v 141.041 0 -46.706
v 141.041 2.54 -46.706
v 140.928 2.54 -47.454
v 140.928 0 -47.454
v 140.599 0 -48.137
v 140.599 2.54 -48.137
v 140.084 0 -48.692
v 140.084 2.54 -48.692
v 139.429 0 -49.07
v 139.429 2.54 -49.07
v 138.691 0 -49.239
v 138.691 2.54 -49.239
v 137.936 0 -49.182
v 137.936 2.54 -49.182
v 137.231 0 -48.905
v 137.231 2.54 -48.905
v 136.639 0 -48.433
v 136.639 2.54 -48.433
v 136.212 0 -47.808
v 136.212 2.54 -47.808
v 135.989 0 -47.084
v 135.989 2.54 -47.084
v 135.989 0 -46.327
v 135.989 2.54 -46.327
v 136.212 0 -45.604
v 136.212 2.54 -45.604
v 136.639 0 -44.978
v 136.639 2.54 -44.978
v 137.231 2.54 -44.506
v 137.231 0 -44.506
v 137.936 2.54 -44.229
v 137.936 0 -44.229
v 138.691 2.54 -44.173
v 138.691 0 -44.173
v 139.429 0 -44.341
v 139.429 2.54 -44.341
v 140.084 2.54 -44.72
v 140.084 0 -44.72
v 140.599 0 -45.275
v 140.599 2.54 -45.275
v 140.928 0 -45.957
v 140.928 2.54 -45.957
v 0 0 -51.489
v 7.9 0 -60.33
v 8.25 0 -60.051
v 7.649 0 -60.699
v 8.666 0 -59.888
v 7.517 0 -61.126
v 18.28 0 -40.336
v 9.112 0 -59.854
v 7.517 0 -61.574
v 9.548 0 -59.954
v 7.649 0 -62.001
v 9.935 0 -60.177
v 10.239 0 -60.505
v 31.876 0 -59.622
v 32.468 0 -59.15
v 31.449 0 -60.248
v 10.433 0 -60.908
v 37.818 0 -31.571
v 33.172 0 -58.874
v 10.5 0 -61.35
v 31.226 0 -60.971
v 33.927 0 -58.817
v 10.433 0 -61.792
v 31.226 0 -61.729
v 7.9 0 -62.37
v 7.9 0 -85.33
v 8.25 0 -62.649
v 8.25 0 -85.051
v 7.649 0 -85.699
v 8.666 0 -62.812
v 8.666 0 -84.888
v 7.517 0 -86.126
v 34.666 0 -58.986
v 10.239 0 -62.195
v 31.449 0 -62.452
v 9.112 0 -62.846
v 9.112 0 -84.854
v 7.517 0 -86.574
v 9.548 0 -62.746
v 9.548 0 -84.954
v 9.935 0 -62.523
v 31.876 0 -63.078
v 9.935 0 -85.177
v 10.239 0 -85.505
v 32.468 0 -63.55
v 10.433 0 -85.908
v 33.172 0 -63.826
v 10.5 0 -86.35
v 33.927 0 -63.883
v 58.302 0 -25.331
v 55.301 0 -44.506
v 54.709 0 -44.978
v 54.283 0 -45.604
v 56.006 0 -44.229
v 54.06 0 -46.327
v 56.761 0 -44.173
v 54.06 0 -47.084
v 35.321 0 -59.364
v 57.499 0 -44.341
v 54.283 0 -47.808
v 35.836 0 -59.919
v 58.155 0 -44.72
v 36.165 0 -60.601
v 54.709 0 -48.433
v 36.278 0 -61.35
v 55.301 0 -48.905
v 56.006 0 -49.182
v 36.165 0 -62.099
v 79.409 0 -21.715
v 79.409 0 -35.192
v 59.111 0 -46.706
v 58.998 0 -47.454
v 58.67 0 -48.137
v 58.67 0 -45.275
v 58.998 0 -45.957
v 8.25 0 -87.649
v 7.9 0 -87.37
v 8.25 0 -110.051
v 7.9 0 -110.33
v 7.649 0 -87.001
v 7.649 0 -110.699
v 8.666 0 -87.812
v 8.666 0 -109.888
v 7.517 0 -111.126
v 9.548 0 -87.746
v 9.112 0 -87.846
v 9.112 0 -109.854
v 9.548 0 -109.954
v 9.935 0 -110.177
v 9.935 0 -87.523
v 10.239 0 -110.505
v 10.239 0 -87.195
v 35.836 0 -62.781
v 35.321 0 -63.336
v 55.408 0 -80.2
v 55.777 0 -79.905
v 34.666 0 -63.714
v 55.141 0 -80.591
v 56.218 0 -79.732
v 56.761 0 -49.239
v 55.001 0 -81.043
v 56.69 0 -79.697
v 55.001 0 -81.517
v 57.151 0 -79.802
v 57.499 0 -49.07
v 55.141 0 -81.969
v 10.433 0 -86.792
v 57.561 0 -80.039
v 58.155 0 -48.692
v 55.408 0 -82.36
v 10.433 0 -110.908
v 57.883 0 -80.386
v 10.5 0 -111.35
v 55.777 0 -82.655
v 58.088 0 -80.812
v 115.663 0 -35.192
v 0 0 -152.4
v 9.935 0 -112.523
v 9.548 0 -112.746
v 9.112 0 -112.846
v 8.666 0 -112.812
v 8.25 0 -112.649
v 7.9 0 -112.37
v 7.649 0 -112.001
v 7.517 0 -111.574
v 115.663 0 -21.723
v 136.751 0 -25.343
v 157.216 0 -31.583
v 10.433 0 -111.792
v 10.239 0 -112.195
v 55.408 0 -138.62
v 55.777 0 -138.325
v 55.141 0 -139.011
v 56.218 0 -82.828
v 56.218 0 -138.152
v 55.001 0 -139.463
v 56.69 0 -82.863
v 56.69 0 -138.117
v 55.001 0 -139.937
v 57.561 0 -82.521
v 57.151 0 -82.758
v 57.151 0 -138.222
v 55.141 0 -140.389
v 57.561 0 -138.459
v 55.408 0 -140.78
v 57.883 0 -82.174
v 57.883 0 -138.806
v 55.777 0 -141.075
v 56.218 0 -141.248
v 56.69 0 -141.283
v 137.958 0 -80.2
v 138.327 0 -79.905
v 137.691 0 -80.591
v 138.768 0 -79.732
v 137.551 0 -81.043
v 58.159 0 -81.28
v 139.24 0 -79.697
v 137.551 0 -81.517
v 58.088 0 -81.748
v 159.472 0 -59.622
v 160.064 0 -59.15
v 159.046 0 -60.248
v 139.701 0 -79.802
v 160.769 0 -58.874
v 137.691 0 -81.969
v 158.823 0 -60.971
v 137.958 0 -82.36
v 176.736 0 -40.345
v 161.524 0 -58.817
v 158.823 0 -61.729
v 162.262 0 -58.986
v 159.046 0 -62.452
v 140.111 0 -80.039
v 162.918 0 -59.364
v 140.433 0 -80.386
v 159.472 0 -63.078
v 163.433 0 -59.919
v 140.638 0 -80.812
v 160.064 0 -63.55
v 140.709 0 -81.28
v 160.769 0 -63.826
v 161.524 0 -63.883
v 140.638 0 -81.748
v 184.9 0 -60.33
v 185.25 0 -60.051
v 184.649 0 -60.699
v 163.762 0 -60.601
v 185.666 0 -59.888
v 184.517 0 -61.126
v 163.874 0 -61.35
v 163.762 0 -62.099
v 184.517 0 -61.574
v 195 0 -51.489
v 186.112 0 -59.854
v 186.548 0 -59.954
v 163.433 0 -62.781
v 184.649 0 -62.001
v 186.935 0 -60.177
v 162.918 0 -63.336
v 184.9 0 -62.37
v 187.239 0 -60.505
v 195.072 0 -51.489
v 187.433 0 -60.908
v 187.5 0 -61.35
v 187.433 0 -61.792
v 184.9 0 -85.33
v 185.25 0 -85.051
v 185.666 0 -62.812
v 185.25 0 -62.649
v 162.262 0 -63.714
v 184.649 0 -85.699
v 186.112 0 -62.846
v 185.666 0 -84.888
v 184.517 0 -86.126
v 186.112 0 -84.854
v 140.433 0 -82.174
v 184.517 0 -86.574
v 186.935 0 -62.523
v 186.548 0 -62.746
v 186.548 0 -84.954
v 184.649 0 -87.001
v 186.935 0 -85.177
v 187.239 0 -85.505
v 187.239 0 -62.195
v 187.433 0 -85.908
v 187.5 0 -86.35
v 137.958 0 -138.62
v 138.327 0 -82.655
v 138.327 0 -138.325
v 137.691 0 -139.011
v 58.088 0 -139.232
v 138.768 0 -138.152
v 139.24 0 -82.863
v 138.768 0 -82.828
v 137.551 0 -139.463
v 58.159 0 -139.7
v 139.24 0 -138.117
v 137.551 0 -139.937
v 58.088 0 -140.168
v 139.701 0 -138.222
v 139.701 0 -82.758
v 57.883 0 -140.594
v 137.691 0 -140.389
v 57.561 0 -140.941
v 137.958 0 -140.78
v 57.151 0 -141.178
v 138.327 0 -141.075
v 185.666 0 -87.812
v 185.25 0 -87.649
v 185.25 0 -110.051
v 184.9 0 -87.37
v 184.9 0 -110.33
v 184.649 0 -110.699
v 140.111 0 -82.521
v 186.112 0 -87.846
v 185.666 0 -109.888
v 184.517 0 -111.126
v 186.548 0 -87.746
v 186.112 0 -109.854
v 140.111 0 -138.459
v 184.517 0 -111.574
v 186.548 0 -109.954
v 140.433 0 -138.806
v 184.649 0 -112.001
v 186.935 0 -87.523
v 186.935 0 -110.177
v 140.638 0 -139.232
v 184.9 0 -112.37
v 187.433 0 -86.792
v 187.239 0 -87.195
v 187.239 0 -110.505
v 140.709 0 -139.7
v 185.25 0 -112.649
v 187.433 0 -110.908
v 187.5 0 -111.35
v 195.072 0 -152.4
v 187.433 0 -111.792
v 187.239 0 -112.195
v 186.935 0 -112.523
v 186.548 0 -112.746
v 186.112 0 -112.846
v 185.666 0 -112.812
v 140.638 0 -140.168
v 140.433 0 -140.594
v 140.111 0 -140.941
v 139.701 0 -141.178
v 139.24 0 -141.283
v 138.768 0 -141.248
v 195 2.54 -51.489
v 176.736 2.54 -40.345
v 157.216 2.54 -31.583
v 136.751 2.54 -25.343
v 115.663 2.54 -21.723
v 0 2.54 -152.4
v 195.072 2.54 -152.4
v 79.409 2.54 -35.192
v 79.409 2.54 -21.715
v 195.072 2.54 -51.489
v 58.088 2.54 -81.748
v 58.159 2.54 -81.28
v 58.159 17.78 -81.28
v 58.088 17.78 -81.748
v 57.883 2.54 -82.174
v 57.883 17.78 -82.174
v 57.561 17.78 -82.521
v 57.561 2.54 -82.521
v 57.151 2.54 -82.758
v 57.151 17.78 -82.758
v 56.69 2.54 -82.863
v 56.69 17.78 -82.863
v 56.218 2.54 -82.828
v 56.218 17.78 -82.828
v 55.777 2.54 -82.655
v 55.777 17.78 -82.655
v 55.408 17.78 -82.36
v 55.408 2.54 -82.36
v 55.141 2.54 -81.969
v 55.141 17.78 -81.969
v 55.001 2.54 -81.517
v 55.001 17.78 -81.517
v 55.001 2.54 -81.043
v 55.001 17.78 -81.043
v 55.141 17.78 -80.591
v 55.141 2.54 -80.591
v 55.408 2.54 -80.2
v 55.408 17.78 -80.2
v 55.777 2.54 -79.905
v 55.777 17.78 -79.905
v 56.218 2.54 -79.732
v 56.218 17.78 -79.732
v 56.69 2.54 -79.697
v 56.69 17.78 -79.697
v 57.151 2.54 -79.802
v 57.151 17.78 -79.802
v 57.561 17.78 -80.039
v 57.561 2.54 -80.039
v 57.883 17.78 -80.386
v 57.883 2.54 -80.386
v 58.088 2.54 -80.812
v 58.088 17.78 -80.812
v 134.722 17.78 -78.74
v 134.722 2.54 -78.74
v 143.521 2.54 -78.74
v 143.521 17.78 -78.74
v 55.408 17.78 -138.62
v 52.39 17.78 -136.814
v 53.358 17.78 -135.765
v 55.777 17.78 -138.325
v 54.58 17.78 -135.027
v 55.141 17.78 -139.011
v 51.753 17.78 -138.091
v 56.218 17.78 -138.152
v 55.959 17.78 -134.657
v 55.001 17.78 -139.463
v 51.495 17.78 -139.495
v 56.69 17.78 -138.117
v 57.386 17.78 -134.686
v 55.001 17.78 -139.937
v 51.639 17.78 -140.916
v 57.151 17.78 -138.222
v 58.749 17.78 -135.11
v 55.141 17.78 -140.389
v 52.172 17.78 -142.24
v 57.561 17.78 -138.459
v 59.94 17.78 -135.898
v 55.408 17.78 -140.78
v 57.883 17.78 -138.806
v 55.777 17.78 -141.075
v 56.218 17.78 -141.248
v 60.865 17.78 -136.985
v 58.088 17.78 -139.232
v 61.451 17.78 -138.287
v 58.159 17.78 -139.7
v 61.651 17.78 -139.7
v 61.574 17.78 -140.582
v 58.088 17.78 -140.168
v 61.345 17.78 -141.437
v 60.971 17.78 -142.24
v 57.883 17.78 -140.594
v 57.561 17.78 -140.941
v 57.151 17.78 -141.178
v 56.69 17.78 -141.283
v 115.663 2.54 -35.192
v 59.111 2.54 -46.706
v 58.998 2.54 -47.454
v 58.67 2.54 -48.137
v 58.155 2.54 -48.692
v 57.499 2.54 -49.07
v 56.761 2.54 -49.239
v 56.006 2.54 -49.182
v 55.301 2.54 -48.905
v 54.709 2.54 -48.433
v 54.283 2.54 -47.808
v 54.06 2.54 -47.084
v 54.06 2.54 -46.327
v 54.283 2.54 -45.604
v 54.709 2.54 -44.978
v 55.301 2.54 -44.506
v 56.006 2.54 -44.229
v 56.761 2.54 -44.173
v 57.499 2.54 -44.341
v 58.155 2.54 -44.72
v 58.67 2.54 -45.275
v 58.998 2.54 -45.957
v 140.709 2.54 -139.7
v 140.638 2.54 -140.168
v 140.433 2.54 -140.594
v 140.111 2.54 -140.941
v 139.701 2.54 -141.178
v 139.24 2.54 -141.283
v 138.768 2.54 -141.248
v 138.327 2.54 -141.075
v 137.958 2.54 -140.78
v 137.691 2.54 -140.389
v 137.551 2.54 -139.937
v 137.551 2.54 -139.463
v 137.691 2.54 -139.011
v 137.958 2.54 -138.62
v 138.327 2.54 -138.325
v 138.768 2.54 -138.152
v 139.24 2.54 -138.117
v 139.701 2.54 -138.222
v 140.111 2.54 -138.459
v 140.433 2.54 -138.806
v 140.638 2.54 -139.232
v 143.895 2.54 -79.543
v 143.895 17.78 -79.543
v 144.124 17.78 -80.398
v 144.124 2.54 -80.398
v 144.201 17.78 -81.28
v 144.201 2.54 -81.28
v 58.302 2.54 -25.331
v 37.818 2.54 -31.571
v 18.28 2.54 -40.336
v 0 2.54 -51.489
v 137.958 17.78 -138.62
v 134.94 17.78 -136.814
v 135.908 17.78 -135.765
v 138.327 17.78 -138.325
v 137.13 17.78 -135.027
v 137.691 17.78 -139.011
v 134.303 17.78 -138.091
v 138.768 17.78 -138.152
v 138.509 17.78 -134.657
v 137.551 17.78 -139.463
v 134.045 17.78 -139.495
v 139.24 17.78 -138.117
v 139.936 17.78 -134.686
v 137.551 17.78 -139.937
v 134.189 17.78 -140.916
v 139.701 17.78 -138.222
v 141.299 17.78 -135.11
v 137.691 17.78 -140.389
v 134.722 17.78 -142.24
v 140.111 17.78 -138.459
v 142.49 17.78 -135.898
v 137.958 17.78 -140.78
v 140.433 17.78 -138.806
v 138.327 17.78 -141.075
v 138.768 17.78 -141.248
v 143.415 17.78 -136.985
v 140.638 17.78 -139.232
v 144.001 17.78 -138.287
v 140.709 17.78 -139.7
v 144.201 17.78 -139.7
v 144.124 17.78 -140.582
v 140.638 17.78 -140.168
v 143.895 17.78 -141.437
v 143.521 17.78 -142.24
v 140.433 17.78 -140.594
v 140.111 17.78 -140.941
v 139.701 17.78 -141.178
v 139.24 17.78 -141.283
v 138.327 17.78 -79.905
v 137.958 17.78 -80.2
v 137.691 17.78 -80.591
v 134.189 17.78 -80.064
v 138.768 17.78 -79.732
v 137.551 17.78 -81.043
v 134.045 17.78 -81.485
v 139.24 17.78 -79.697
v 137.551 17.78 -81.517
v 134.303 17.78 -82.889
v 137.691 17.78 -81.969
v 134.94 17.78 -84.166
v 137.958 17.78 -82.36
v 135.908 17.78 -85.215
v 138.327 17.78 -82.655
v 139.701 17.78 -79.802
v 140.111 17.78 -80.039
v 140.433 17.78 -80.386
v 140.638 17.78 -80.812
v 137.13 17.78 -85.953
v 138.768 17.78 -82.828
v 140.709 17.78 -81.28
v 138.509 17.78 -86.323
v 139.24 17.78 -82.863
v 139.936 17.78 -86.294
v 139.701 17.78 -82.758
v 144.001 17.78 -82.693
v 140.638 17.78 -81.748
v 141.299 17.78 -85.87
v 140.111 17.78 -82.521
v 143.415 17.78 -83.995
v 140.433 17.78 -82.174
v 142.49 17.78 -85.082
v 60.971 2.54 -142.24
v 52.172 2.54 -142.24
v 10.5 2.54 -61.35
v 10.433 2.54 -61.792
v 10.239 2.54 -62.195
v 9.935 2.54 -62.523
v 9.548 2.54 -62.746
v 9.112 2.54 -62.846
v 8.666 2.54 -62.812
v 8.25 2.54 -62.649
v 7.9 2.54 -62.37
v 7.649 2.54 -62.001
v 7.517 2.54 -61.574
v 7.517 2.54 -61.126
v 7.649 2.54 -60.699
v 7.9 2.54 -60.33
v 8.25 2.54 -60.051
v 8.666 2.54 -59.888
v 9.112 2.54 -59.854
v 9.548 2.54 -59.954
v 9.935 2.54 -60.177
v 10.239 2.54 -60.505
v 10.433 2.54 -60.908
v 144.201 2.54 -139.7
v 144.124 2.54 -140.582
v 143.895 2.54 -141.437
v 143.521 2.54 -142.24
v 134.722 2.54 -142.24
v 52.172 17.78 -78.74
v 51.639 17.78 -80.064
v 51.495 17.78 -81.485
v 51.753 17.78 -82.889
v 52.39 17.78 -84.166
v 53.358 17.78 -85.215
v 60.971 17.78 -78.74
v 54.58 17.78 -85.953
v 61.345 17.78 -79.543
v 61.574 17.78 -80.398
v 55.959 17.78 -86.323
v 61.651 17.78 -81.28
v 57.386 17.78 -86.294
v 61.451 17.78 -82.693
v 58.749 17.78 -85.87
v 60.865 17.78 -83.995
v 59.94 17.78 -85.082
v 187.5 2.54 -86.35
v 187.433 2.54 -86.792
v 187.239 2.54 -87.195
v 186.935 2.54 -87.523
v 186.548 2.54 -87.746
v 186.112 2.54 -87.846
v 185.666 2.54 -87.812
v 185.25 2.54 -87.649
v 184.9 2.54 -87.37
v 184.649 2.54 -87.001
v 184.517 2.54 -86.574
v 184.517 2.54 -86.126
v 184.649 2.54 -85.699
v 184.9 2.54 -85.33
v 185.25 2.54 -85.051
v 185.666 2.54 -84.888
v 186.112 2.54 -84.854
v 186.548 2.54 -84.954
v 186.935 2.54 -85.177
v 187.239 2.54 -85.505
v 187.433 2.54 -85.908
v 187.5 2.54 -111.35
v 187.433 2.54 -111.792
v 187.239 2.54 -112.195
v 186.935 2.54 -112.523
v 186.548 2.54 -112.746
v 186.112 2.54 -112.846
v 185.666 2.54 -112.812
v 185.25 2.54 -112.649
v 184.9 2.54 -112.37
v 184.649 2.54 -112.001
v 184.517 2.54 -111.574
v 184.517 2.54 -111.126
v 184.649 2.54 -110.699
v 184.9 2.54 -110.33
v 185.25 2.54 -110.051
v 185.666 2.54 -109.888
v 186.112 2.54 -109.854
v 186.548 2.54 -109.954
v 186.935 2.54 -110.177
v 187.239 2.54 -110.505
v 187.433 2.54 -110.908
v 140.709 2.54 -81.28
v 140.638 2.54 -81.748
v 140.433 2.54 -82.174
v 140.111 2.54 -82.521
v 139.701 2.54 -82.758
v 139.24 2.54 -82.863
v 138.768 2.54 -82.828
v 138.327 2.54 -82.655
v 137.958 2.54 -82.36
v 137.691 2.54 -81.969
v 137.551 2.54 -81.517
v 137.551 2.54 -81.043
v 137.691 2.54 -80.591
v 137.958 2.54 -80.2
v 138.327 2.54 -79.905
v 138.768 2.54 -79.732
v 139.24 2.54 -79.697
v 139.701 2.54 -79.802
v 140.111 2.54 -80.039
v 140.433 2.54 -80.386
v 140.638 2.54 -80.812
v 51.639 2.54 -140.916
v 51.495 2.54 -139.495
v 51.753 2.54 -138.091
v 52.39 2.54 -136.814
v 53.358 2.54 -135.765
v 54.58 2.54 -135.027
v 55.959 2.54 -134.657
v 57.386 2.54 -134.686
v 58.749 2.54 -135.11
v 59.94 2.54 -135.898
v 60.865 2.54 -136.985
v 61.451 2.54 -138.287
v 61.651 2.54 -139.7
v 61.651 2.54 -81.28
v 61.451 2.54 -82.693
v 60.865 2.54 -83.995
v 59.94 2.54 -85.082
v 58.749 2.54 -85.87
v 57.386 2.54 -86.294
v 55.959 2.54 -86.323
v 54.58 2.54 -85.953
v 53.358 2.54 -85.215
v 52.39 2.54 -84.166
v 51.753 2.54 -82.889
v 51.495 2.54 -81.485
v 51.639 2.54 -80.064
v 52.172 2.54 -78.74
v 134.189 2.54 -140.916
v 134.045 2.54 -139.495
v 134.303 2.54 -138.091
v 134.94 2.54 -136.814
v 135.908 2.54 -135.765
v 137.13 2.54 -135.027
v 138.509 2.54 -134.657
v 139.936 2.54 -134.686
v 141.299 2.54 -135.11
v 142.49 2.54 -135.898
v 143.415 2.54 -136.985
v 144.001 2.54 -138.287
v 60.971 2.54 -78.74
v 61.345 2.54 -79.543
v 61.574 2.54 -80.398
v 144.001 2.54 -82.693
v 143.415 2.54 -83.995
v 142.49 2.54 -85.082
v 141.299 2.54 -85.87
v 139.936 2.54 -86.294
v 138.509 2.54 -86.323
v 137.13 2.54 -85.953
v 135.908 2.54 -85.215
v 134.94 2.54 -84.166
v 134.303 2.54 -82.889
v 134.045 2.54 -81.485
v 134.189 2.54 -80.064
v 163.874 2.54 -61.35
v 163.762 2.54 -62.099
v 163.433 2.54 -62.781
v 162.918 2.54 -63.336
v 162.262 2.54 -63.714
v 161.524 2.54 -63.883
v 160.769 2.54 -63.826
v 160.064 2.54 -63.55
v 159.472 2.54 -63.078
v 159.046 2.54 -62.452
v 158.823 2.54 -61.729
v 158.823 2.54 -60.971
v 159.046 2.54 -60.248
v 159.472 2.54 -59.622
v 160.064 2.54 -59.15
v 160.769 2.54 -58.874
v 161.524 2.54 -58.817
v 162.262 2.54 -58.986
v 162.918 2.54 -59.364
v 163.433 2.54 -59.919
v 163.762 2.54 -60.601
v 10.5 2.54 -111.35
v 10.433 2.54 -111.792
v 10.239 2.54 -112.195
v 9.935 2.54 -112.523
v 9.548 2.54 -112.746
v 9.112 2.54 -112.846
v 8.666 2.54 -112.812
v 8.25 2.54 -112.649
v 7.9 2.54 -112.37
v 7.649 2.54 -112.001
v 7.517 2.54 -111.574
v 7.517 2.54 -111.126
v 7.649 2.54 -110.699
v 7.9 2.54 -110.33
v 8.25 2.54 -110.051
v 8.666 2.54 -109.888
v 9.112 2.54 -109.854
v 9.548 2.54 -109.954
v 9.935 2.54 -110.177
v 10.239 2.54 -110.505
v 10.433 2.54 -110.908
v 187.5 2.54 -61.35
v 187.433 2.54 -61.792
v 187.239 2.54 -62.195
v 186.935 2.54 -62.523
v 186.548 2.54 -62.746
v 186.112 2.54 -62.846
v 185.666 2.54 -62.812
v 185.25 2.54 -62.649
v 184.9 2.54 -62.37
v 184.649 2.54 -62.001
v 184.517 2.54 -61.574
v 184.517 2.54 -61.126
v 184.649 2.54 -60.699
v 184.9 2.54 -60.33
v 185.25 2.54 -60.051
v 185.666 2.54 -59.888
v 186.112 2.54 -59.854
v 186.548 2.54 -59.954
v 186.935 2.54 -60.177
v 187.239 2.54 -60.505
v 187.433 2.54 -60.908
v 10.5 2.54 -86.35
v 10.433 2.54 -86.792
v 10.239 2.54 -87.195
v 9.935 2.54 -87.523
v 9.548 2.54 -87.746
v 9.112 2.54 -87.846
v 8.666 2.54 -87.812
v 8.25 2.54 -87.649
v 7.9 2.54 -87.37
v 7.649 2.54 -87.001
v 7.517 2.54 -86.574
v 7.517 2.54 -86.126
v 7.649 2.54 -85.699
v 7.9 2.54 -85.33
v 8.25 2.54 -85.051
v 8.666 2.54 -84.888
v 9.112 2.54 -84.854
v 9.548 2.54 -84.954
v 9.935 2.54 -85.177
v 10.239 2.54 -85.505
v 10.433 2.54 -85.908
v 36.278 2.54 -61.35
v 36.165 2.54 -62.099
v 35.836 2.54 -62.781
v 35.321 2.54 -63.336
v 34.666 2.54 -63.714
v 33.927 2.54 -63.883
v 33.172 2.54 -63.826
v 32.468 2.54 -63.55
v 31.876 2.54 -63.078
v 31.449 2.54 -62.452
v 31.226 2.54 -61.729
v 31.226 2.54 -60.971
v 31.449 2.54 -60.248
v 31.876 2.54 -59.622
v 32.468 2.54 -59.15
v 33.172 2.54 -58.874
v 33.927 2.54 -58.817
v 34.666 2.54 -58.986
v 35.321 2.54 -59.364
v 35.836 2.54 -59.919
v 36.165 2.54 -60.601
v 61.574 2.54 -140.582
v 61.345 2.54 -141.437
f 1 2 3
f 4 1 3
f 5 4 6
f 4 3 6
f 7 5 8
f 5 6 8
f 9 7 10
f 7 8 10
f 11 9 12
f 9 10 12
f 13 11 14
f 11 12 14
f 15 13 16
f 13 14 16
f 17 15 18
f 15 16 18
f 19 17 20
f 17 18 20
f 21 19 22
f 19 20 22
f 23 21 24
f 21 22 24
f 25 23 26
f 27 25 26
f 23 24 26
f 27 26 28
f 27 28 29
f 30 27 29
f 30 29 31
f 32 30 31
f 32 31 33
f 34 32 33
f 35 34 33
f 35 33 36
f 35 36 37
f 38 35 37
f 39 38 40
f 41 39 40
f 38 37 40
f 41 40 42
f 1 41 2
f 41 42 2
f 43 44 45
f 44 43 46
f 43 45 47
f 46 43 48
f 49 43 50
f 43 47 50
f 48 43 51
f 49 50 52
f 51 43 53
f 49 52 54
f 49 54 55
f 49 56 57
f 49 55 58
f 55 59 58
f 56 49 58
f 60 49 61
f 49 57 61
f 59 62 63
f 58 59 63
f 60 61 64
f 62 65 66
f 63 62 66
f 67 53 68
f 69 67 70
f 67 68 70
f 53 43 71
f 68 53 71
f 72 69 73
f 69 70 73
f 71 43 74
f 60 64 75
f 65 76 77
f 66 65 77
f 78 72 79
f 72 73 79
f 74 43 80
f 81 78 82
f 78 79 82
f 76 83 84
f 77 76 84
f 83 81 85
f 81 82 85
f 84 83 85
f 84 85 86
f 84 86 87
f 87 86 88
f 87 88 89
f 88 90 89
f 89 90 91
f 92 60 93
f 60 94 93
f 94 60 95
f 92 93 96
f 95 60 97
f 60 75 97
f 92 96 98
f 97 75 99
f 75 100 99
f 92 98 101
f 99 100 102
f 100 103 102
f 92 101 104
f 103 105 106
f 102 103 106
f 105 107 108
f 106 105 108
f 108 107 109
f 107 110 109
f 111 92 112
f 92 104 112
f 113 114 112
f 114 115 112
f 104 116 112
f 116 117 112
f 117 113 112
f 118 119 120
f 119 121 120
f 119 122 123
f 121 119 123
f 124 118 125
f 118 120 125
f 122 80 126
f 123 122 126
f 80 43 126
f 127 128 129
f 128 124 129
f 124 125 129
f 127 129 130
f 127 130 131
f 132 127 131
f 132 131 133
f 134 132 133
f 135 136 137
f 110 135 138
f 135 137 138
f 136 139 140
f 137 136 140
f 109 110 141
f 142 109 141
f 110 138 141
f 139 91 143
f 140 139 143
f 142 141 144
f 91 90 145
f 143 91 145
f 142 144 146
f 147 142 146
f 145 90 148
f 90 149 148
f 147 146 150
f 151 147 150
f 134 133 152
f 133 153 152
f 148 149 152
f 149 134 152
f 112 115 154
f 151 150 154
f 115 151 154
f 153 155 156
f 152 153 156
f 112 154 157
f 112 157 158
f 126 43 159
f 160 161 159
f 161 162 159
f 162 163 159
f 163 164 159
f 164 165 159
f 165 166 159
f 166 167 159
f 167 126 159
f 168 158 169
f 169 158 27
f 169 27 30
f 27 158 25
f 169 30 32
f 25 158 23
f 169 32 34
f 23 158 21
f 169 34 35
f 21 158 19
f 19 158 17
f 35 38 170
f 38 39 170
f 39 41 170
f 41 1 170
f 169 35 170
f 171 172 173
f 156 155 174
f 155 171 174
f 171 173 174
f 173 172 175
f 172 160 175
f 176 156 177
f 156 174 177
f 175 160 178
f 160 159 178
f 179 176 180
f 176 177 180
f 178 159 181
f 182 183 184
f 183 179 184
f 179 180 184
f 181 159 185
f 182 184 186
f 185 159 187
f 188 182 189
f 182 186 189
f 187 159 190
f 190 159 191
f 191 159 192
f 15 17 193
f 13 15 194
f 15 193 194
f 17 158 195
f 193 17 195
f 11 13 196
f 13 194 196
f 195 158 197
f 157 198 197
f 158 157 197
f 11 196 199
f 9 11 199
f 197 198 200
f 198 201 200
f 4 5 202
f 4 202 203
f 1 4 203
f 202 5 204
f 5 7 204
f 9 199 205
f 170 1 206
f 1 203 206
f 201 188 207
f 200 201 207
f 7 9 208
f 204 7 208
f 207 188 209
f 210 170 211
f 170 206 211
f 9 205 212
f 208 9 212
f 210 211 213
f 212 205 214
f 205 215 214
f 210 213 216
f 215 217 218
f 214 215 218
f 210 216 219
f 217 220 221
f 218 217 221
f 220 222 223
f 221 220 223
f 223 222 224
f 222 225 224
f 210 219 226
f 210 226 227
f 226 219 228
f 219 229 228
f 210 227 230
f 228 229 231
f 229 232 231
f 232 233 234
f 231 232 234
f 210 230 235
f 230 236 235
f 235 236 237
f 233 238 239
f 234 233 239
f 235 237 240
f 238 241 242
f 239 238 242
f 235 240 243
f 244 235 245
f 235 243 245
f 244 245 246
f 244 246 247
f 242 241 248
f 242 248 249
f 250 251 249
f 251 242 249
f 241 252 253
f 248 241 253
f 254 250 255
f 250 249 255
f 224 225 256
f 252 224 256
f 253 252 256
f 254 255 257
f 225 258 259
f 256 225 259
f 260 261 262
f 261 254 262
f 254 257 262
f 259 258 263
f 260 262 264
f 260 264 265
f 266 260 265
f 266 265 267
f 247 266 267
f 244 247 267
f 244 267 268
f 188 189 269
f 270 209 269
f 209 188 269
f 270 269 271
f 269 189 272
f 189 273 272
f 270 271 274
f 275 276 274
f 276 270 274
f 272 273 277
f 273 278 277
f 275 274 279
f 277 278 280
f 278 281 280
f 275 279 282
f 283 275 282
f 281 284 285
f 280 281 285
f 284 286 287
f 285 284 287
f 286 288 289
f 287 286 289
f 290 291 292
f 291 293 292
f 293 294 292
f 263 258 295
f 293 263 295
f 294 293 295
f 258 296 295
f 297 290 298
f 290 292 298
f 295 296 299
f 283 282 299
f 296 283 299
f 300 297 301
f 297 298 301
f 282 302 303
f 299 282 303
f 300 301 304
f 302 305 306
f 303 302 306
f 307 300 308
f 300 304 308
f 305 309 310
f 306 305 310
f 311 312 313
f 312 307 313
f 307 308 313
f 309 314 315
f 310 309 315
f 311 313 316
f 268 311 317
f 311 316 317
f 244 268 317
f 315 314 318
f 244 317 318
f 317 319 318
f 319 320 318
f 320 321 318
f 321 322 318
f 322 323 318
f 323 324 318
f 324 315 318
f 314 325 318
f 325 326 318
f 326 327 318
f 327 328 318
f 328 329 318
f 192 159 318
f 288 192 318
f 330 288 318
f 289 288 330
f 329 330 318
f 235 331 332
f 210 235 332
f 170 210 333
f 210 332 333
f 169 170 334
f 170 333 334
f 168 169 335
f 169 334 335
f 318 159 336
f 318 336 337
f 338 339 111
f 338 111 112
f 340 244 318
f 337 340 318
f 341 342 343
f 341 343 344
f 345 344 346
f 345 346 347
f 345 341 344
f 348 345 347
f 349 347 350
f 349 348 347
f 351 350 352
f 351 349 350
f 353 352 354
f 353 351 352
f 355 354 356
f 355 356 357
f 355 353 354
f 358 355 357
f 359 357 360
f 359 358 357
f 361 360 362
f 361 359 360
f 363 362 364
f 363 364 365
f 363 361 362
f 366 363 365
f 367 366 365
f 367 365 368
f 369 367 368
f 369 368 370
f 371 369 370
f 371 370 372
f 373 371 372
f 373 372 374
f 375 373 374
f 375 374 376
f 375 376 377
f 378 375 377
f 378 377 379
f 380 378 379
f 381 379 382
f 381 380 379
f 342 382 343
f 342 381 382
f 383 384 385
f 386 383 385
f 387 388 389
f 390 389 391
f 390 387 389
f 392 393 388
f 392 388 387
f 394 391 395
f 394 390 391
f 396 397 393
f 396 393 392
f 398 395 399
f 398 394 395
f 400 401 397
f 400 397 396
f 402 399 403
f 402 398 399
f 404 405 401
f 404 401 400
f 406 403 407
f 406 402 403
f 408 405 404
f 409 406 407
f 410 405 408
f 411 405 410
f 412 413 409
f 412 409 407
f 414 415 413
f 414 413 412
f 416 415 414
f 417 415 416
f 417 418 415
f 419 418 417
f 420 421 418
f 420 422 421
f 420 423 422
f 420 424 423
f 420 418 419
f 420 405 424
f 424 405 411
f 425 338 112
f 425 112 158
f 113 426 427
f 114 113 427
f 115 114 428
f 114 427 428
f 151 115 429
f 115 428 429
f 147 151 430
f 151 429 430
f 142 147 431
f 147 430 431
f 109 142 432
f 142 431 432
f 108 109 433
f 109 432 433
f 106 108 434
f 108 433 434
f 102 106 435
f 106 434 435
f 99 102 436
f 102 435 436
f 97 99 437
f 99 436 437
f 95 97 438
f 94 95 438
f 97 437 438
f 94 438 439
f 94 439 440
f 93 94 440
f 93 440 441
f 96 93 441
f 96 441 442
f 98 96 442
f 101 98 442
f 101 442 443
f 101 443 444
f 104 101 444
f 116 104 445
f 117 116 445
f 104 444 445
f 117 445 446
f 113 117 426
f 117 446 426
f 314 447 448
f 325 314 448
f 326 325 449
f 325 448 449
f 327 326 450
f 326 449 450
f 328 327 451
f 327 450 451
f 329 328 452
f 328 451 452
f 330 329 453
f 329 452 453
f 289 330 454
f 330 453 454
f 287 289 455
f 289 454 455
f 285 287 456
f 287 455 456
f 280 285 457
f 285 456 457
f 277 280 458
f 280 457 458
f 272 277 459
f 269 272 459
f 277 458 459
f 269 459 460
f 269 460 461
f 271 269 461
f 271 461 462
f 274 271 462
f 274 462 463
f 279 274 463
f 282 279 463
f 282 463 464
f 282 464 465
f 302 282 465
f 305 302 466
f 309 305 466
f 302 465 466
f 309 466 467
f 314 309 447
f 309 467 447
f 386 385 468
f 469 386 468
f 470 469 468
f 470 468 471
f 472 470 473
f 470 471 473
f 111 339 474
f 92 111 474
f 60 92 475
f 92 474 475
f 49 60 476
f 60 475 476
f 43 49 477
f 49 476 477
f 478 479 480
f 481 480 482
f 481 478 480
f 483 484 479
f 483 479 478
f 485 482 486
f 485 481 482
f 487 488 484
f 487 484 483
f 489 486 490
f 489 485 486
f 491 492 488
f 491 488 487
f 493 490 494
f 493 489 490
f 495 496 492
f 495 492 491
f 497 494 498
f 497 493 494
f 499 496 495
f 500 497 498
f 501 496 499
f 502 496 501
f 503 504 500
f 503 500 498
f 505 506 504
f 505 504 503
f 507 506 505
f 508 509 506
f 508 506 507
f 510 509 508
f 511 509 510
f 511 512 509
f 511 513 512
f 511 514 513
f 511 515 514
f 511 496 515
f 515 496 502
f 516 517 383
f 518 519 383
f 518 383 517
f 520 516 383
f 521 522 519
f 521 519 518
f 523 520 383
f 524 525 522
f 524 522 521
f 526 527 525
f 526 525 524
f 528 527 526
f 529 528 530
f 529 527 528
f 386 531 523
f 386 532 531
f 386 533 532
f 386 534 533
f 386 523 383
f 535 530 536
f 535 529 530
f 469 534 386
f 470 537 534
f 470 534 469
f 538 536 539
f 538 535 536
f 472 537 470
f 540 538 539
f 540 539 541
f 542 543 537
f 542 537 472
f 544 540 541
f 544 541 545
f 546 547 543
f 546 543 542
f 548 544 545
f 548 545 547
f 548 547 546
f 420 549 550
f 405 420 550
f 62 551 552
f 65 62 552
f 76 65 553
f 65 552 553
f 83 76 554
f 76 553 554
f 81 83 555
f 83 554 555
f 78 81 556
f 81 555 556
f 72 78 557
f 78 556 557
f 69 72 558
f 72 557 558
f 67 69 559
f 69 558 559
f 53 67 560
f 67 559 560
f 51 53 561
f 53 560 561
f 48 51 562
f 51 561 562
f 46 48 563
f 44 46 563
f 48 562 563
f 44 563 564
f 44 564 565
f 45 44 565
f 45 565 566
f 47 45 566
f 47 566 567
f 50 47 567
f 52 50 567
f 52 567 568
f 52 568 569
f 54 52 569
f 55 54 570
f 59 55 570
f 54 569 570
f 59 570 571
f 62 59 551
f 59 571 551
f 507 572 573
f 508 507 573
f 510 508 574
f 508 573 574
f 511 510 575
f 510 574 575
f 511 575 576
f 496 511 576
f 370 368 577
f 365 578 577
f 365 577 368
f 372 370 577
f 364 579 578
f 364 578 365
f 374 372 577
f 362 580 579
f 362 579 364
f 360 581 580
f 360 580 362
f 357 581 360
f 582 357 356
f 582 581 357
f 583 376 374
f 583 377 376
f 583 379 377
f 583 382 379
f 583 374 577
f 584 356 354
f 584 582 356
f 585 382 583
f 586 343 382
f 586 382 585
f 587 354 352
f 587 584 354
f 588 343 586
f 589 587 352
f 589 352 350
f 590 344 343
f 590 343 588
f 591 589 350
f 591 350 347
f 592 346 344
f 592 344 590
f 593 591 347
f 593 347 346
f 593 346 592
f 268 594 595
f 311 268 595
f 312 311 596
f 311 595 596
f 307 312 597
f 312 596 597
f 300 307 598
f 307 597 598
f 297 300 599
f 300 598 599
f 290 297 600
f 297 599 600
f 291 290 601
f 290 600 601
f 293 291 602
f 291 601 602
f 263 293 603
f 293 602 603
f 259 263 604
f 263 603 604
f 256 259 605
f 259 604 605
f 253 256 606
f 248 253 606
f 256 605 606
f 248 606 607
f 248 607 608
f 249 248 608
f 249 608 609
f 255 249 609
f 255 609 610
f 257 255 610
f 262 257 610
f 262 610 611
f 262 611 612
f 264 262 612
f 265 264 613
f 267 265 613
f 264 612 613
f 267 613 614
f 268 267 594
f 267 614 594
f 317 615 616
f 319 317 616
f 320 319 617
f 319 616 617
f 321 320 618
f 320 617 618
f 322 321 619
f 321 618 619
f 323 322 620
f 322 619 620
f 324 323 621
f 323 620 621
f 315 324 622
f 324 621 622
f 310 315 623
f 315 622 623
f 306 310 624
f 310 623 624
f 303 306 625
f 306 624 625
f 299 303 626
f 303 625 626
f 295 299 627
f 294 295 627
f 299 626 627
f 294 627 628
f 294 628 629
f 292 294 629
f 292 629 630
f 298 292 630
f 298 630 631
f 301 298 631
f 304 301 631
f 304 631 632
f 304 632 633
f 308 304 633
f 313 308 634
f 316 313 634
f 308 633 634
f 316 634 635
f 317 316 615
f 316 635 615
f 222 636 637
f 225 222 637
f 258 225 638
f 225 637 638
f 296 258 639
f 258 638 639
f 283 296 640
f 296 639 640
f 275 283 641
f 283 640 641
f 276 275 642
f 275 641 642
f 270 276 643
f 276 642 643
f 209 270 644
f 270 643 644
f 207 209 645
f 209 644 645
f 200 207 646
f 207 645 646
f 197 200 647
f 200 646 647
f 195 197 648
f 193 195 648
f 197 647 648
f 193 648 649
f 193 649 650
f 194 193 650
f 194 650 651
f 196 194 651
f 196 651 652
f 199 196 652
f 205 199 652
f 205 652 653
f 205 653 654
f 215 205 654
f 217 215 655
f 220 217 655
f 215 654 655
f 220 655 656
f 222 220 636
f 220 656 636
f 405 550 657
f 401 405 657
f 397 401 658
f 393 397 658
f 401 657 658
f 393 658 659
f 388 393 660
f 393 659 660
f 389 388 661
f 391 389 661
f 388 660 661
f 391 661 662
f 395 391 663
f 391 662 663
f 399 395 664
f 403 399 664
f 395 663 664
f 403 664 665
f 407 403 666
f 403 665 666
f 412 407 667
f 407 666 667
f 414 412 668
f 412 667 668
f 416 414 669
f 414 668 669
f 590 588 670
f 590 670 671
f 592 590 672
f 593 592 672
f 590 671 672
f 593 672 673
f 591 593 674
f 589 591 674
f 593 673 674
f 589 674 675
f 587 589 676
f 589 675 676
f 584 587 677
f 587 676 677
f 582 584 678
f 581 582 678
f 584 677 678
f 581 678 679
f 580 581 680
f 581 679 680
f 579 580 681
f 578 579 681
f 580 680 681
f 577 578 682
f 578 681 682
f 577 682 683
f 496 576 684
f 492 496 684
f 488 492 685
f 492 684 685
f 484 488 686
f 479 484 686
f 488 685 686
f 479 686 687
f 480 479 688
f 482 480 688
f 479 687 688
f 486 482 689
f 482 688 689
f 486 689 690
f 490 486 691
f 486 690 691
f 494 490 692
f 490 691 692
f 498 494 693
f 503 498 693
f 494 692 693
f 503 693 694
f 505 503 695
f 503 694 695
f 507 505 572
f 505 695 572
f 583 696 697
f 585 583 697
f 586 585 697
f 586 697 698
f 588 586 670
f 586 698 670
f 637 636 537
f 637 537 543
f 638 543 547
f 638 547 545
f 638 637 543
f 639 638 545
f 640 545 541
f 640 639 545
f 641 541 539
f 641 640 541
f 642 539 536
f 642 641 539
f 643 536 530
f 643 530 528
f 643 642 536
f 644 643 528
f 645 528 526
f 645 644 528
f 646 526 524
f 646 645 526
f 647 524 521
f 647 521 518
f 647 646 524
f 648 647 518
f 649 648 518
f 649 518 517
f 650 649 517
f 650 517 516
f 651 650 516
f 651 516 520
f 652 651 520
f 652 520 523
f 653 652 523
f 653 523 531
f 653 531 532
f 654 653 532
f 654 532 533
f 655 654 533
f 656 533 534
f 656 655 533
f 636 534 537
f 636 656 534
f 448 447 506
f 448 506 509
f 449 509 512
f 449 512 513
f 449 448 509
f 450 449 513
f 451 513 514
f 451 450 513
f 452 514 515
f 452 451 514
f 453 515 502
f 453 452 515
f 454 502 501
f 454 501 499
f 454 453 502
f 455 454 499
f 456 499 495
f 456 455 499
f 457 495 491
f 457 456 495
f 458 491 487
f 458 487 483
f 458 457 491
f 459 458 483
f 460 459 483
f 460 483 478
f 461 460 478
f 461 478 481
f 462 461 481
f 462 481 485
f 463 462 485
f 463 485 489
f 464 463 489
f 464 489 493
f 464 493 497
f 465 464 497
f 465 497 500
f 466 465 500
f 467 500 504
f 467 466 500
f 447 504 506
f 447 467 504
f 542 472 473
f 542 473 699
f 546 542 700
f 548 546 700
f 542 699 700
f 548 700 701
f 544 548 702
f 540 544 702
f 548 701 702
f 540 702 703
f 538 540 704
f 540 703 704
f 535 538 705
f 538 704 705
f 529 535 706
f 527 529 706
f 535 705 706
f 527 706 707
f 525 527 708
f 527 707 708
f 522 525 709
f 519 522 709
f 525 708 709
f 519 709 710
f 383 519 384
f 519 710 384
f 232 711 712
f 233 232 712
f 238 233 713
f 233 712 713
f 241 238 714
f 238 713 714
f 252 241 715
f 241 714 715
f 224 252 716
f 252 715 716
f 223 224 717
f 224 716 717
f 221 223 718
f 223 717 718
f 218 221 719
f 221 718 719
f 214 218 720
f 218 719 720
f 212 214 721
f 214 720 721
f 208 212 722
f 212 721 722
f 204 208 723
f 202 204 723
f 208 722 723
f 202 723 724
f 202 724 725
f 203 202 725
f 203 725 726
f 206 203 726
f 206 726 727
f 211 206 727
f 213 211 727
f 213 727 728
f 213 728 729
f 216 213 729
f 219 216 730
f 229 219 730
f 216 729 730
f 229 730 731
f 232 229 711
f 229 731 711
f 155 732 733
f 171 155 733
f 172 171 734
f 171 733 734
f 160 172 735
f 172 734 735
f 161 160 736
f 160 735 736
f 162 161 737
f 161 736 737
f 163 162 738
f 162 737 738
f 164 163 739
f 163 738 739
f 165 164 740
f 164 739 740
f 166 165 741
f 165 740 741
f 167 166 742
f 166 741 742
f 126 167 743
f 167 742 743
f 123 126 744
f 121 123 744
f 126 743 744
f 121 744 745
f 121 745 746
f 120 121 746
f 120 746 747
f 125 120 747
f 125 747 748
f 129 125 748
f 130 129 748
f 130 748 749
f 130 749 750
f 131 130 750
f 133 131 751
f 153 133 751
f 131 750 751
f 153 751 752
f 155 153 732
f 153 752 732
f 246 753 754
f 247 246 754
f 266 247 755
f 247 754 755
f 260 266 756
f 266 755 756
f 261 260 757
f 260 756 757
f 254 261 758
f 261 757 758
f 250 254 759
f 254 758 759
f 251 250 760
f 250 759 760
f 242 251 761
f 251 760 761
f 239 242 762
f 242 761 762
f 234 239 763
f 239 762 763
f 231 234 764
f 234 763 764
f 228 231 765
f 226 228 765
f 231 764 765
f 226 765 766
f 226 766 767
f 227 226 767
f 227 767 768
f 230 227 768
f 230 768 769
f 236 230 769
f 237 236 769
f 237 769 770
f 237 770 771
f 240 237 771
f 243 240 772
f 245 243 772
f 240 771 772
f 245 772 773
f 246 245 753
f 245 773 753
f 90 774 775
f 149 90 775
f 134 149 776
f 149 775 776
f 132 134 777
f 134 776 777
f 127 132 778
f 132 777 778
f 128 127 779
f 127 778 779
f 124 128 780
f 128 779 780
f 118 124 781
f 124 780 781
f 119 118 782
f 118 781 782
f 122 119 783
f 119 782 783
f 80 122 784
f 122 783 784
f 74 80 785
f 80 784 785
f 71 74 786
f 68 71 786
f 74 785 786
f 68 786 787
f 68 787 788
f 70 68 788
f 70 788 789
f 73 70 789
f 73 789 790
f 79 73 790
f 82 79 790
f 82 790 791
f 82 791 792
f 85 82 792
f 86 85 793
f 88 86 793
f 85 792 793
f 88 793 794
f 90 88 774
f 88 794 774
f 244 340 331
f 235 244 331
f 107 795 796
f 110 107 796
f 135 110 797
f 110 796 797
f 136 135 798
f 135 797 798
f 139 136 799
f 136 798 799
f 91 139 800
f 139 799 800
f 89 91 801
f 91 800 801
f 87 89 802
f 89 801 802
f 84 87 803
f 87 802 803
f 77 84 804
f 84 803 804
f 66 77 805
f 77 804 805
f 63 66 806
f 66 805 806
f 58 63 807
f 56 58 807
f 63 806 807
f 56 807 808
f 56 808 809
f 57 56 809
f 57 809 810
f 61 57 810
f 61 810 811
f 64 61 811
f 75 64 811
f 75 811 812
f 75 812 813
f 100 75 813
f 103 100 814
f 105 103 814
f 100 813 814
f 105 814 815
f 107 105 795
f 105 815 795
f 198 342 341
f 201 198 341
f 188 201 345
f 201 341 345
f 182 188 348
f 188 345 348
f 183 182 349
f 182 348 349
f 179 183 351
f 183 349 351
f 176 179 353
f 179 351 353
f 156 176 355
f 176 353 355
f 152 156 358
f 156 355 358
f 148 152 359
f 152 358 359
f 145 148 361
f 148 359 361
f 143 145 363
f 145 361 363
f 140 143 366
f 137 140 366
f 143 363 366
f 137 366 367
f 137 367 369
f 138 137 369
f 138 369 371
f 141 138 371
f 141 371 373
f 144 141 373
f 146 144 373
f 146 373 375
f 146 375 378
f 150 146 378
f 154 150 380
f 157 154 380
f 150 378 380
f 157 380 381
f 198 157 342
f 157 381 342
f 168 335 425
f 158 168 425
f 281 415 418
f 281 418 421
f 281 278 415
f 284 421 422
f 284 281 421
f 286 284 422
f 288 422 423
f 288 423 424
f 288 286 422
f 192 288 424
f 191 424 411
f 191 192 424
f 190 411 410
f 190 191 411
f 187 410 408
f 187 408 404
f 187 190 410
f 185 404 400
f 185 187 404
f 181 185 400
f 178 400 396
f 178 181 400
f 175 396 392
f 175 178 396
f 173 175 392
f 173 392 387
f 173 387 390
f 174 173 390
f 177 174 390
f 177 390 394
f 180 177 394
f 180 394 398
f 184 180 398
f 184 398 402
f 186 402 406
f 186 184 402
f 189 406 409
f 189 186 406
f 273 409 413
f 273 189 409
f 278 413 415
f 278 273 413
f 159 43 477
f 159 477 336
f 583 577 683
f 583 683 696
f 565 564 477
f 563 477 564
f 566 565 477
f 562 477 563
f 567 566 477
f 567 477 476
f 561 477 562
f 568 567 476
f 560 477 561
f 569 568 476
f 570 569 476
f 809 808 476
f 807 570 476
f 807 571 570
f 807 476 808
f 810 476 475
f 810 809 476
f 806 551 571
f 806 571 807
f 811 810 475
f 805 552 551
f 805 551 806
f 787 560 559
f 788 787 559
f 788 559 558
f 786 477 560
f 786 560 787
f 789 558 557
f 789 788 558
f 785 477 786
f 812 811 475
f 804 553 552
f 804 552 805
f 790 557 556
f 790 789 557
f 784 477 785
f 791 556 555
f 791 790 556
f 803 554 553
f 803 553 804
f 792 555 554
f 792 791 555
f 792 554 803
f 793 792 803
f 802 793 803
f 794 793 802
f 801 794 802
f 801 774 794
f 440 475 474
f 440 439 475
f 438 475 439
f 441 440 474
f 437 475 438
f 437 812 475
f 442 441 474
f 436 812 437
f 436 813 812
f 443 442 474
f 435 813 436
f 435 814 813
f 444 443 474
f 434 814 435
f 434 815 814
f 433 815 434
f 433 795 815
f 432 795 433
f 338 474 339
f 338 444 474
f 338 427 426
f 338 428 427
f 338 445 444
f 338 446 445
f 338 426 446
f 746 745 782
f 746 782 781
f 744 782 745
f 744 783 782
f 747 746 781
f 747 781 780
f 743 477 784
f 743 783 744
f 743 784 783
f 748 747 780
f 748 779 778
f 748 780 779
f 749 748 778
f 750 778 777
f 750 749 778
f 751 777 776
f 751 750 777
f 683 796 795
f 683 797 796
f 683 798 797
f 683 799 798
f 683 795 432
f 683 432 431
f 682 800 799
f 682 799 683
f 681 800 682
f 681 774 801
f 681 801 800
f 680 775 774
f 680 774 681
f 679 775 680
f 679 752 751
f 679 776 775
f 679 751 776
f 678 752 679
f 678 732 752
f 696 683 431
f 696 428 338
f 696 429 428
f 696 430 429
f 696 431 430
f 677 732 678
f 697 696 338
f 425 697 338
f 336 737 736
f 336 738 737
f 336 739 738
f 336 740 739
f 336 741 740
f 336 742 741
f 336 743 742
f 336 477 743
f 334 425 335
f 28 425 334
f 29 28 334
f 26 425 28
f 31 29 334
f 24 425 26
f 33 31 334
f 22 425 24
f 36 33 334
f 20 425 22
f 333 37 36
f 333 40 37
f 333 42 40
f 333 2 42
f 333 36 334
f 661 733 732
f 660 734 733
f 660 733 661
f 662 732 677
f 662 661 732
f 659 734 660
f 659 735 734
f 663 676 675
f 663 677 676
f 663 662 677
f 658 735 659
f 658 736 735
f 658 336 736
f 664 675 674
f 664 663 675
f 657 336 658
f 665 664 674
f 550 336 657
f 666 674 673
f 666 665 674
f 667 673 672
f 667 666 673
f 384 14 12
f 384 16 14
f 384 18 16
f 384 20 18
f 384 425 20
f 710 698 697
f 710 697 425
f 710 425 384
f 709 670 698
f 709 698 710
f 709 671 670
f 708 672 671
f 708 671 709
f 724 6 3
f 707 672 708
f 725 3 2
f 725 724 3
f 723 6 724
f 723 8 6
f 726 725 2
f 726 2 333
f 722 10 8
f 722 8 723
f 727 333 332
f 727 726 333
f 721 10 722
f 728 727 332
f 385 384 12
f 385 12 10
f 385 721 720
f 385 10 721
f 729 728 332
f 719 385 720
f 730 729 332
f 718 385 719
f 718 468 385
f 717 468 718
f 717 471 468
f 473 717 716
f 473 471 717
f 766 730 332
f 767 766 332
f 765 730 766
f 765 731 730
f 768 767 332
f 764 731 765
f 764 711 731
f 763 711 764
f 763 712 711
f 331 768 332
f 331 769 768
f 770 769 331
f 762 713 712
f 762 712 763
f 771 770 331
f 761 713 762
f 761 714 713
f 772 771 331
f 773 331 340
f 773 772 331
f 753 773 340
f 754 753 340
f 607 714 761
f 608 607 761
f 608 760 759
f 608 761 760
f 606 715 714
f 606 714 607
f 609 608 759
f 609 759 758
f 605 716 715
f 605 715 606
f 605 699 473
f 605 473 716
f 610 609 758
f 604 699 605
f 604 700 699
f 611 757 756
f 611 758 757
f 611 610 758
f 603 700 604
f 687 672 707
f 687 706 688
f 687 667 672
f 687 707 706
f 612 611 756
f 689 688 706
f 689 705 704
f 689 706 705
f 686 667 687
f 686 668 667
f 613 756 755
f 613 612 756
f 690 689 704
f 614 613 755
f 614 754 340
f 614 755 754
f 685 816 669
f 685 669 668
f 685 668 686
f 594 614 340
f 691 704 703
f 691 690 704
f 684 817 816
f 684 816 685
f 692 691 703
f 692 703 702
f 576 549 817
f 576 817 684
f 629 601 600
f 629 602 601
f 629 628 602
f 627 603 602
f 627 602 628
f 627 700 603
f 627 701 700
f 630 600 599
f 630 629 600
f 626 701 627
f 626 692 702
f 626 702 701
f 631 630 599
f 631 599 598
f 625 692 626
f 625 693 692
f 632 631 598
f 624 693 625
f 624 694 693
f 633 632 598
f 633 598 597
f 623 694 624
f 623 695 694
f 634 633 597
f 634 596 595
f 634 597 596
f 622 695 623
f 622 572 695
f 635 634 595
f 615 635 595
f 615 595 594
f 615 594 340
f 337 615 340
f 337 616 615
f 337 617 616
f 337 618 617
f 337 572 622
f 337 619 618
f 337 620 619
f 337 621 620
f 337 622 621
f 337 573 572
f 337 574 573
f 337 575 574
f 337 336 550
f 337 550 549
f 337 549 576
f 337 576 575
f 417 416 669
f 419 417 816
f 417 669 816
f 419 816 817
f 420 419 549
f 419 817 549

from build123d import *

# Parameters (mm, degrees)
SKETCH1_W           = 195.072
SKETCH1_H           = 152.4
BOSS_EXTRUDE1_DEPTH = 2.54
SKETCH2_R           = 1.5875
SKETCH2_R_2         = 1.5
SKETCH2_R_3         = 2.54
SKETCH2_W           = 36.254936194
SKETCH2_H           = 46.345137013
CUT_EXTRUDE1_DEPTH  = 2.54
CUT_EXTRUDE2_DEPTH  = 2.54
SKETCH6_R           = 1.5875
BOSS_EXTRUDE2_DEPTH = 15.24


with BuildPart() as part:
    # Sketch1 → Boss-Extrude1 (new body)
    with BuildSketch(Plane(origin=(0, 0, 0), x_dir=(1, 0, 0), z_dir=(0, 1, 0))):
        with Locations((97.536, 76.2)):
            Rectangle(SKETCH1_W, SKETCH1_H)
    extrude(amount=BOSS_EXTRUDE1_DEPTH)

    # Sketch2 → Cut-Extrude1 (cut)
    with BuildSketch(Plane(origin=(0, 2.54, 0), x_dir=(1, 0, 0), z_dir=(0, 1, 0))):
        with Locations((56.571242474, 139.7)):
            Circle(SKETCH2_R)
        with Locations((139.121242474, 139.7)):
            Circle(SKETCH2_R)
        with Locations((139.121242474, 81.28)):
            Circle(SKETCH2_R)
        with Locations((56.571242474, 81.28)):
            Circle(SKETCH2_R)
        with Locations((186, 61.35)):
            Circle(SKETCH2_R_2)
        with Locations((186, 86.35)):
            Circle(SKETCH2_R_2)
        with Locations((186, 111.35)):
            Circle(SKETCH2_R_2)
        with Locations((9, 111.35)):
            Circle(SKETCH2_R_2)
        with Locations((9, 86.35)):
            Circle(SKETCH2_R_2)
        with Locations((9, 61.35)):
            Circle(SKETCH2_R_2)
        with Locations((56.571242474, 46.705739829)):
            Circle(SKETCH2_R_3)
        with Locations((33.737644143, 61.35)):
            Circle(SKETCH2_R_3)
        with Locations((161.334355857, 61.35)):
            Circle(SKETCH2_R_3)
        with Locations((138.500757526, 46.705739829)):
            Circle(SKETCH2_R_3)
        with Locations((97.536, 12.019328057)):
            Rectangle(SKETCH2_W, SKETCH2_H)
    extrude(amount=-CUT_EXTRUDE1_DEPTH, mode=Mode.SUBTRACT)

    # Sketch4 → Cut-Extrude2 (cut)
    with BuildSketch(Plane(origin=(0, 2.54, 0), x_dir=(1, 0, 0), z_dir=(0, 1, 0))):
        with BuildLine():
            Line((195.072, 51.488555228), (195, 51.488555228))
            ThreePointArc((195, 51.488555228), (157.216035085, 31.583435817), (115.663468097, 21.723113302))
            Line((115.663468097, 21.723113302), (115.663468097, 0))
            Line((115.663468097, 0), (195.072, 0))
            Line((195.072, 0), (195.072, 51.488555228))
        make_face()
        with BuildLine():
            ThreePointArc((79.408531903, 21.715391762), (37.817865405, 31.570721166), (0, 51.488555228))
            Line((0, 51.488555228), (0, 0))
            Line((0, 0), (79.408531903, 0))
            Line((79.408531903, 0), (79.408531903, 21.715391762))
        make_face()
    extrude(amount=-CUT_EXTRUDE2_DEPTH, mode=Mode.SUBTRACT)

    # Sketch6 → Boss-Extrude2 (add)
    with BuildSketch(Plane(origin=(0, 2.54, 0), x_dir=(1, 0, 0), z_dir=(0, 1, 0))):
        with BuildLine():
            Line((60.970651525, 142.24), (52.171833423, 142.24))
            ThreePointArc((52.171833423, 142.24), (55.256441725, 134.793096802), (61.651242474, 139.7))
            ThreePointArc((61.651242474, 139.7), (61.478145672, 141.014800749), (60.970651525, 142.24))
        make_face()
        with Locations((56.571242474, 139.7)):
            Circle(SKETCH6_R, mode=Mode.SUBTRACT)
        with BuildLine():
            ThreePointArc((144.201242474, 139.7), (144.028145672, 141.014800749), (143.520651525, 142.24))
            Line((143.520651525, 142.24), (134.721833423, 142.24))
            ThreePointArc((134.721833423, 142.24), (137.806441725, 134.793096802), (144.201242474, 139.7))
        make_face()
        with Locations((139.121242474, 139.7)):
            Circle(SKETCH6_R, mode=Mode.SUBTRACT)
        with BuildLine():
            Line((134.721833423, 78.74), (143.520651525, 78.74))
            ThreePointArc((143.520651525, 78.74), (144.028145672, 79.965199251), (144.201242474, 81.28))
            ThreePointArc((144.201242474, 81.28), (137.806441725, 86.186903198), (134.721833423, 78.74))
        make_face()
        with Locations((139.121242474, 81.28)):
            Circle(SKETCH6_R, mode=Mode.SUBTRACT)
        with BuildLine():
            ThreePointArc((61.651242474, 81.28), (55.256441725, 86.186903198), (52.171833423, 78.74))
            Line((52.171833423, 78.74), (60.970651525, 78.74))
            ThreePointArc((60.970651525, 78.74), (61.478145672, 79.965199251), (61.651242474, 81.28))
        make_face()
        with Locations((56.571242474, 81.28)):
            Circle(SKETCH6_R, mode=Mode.SUBTRACT)
    extrude(amount=BOSS_EXTRUDE2_DEPTH)


solid = part.part
